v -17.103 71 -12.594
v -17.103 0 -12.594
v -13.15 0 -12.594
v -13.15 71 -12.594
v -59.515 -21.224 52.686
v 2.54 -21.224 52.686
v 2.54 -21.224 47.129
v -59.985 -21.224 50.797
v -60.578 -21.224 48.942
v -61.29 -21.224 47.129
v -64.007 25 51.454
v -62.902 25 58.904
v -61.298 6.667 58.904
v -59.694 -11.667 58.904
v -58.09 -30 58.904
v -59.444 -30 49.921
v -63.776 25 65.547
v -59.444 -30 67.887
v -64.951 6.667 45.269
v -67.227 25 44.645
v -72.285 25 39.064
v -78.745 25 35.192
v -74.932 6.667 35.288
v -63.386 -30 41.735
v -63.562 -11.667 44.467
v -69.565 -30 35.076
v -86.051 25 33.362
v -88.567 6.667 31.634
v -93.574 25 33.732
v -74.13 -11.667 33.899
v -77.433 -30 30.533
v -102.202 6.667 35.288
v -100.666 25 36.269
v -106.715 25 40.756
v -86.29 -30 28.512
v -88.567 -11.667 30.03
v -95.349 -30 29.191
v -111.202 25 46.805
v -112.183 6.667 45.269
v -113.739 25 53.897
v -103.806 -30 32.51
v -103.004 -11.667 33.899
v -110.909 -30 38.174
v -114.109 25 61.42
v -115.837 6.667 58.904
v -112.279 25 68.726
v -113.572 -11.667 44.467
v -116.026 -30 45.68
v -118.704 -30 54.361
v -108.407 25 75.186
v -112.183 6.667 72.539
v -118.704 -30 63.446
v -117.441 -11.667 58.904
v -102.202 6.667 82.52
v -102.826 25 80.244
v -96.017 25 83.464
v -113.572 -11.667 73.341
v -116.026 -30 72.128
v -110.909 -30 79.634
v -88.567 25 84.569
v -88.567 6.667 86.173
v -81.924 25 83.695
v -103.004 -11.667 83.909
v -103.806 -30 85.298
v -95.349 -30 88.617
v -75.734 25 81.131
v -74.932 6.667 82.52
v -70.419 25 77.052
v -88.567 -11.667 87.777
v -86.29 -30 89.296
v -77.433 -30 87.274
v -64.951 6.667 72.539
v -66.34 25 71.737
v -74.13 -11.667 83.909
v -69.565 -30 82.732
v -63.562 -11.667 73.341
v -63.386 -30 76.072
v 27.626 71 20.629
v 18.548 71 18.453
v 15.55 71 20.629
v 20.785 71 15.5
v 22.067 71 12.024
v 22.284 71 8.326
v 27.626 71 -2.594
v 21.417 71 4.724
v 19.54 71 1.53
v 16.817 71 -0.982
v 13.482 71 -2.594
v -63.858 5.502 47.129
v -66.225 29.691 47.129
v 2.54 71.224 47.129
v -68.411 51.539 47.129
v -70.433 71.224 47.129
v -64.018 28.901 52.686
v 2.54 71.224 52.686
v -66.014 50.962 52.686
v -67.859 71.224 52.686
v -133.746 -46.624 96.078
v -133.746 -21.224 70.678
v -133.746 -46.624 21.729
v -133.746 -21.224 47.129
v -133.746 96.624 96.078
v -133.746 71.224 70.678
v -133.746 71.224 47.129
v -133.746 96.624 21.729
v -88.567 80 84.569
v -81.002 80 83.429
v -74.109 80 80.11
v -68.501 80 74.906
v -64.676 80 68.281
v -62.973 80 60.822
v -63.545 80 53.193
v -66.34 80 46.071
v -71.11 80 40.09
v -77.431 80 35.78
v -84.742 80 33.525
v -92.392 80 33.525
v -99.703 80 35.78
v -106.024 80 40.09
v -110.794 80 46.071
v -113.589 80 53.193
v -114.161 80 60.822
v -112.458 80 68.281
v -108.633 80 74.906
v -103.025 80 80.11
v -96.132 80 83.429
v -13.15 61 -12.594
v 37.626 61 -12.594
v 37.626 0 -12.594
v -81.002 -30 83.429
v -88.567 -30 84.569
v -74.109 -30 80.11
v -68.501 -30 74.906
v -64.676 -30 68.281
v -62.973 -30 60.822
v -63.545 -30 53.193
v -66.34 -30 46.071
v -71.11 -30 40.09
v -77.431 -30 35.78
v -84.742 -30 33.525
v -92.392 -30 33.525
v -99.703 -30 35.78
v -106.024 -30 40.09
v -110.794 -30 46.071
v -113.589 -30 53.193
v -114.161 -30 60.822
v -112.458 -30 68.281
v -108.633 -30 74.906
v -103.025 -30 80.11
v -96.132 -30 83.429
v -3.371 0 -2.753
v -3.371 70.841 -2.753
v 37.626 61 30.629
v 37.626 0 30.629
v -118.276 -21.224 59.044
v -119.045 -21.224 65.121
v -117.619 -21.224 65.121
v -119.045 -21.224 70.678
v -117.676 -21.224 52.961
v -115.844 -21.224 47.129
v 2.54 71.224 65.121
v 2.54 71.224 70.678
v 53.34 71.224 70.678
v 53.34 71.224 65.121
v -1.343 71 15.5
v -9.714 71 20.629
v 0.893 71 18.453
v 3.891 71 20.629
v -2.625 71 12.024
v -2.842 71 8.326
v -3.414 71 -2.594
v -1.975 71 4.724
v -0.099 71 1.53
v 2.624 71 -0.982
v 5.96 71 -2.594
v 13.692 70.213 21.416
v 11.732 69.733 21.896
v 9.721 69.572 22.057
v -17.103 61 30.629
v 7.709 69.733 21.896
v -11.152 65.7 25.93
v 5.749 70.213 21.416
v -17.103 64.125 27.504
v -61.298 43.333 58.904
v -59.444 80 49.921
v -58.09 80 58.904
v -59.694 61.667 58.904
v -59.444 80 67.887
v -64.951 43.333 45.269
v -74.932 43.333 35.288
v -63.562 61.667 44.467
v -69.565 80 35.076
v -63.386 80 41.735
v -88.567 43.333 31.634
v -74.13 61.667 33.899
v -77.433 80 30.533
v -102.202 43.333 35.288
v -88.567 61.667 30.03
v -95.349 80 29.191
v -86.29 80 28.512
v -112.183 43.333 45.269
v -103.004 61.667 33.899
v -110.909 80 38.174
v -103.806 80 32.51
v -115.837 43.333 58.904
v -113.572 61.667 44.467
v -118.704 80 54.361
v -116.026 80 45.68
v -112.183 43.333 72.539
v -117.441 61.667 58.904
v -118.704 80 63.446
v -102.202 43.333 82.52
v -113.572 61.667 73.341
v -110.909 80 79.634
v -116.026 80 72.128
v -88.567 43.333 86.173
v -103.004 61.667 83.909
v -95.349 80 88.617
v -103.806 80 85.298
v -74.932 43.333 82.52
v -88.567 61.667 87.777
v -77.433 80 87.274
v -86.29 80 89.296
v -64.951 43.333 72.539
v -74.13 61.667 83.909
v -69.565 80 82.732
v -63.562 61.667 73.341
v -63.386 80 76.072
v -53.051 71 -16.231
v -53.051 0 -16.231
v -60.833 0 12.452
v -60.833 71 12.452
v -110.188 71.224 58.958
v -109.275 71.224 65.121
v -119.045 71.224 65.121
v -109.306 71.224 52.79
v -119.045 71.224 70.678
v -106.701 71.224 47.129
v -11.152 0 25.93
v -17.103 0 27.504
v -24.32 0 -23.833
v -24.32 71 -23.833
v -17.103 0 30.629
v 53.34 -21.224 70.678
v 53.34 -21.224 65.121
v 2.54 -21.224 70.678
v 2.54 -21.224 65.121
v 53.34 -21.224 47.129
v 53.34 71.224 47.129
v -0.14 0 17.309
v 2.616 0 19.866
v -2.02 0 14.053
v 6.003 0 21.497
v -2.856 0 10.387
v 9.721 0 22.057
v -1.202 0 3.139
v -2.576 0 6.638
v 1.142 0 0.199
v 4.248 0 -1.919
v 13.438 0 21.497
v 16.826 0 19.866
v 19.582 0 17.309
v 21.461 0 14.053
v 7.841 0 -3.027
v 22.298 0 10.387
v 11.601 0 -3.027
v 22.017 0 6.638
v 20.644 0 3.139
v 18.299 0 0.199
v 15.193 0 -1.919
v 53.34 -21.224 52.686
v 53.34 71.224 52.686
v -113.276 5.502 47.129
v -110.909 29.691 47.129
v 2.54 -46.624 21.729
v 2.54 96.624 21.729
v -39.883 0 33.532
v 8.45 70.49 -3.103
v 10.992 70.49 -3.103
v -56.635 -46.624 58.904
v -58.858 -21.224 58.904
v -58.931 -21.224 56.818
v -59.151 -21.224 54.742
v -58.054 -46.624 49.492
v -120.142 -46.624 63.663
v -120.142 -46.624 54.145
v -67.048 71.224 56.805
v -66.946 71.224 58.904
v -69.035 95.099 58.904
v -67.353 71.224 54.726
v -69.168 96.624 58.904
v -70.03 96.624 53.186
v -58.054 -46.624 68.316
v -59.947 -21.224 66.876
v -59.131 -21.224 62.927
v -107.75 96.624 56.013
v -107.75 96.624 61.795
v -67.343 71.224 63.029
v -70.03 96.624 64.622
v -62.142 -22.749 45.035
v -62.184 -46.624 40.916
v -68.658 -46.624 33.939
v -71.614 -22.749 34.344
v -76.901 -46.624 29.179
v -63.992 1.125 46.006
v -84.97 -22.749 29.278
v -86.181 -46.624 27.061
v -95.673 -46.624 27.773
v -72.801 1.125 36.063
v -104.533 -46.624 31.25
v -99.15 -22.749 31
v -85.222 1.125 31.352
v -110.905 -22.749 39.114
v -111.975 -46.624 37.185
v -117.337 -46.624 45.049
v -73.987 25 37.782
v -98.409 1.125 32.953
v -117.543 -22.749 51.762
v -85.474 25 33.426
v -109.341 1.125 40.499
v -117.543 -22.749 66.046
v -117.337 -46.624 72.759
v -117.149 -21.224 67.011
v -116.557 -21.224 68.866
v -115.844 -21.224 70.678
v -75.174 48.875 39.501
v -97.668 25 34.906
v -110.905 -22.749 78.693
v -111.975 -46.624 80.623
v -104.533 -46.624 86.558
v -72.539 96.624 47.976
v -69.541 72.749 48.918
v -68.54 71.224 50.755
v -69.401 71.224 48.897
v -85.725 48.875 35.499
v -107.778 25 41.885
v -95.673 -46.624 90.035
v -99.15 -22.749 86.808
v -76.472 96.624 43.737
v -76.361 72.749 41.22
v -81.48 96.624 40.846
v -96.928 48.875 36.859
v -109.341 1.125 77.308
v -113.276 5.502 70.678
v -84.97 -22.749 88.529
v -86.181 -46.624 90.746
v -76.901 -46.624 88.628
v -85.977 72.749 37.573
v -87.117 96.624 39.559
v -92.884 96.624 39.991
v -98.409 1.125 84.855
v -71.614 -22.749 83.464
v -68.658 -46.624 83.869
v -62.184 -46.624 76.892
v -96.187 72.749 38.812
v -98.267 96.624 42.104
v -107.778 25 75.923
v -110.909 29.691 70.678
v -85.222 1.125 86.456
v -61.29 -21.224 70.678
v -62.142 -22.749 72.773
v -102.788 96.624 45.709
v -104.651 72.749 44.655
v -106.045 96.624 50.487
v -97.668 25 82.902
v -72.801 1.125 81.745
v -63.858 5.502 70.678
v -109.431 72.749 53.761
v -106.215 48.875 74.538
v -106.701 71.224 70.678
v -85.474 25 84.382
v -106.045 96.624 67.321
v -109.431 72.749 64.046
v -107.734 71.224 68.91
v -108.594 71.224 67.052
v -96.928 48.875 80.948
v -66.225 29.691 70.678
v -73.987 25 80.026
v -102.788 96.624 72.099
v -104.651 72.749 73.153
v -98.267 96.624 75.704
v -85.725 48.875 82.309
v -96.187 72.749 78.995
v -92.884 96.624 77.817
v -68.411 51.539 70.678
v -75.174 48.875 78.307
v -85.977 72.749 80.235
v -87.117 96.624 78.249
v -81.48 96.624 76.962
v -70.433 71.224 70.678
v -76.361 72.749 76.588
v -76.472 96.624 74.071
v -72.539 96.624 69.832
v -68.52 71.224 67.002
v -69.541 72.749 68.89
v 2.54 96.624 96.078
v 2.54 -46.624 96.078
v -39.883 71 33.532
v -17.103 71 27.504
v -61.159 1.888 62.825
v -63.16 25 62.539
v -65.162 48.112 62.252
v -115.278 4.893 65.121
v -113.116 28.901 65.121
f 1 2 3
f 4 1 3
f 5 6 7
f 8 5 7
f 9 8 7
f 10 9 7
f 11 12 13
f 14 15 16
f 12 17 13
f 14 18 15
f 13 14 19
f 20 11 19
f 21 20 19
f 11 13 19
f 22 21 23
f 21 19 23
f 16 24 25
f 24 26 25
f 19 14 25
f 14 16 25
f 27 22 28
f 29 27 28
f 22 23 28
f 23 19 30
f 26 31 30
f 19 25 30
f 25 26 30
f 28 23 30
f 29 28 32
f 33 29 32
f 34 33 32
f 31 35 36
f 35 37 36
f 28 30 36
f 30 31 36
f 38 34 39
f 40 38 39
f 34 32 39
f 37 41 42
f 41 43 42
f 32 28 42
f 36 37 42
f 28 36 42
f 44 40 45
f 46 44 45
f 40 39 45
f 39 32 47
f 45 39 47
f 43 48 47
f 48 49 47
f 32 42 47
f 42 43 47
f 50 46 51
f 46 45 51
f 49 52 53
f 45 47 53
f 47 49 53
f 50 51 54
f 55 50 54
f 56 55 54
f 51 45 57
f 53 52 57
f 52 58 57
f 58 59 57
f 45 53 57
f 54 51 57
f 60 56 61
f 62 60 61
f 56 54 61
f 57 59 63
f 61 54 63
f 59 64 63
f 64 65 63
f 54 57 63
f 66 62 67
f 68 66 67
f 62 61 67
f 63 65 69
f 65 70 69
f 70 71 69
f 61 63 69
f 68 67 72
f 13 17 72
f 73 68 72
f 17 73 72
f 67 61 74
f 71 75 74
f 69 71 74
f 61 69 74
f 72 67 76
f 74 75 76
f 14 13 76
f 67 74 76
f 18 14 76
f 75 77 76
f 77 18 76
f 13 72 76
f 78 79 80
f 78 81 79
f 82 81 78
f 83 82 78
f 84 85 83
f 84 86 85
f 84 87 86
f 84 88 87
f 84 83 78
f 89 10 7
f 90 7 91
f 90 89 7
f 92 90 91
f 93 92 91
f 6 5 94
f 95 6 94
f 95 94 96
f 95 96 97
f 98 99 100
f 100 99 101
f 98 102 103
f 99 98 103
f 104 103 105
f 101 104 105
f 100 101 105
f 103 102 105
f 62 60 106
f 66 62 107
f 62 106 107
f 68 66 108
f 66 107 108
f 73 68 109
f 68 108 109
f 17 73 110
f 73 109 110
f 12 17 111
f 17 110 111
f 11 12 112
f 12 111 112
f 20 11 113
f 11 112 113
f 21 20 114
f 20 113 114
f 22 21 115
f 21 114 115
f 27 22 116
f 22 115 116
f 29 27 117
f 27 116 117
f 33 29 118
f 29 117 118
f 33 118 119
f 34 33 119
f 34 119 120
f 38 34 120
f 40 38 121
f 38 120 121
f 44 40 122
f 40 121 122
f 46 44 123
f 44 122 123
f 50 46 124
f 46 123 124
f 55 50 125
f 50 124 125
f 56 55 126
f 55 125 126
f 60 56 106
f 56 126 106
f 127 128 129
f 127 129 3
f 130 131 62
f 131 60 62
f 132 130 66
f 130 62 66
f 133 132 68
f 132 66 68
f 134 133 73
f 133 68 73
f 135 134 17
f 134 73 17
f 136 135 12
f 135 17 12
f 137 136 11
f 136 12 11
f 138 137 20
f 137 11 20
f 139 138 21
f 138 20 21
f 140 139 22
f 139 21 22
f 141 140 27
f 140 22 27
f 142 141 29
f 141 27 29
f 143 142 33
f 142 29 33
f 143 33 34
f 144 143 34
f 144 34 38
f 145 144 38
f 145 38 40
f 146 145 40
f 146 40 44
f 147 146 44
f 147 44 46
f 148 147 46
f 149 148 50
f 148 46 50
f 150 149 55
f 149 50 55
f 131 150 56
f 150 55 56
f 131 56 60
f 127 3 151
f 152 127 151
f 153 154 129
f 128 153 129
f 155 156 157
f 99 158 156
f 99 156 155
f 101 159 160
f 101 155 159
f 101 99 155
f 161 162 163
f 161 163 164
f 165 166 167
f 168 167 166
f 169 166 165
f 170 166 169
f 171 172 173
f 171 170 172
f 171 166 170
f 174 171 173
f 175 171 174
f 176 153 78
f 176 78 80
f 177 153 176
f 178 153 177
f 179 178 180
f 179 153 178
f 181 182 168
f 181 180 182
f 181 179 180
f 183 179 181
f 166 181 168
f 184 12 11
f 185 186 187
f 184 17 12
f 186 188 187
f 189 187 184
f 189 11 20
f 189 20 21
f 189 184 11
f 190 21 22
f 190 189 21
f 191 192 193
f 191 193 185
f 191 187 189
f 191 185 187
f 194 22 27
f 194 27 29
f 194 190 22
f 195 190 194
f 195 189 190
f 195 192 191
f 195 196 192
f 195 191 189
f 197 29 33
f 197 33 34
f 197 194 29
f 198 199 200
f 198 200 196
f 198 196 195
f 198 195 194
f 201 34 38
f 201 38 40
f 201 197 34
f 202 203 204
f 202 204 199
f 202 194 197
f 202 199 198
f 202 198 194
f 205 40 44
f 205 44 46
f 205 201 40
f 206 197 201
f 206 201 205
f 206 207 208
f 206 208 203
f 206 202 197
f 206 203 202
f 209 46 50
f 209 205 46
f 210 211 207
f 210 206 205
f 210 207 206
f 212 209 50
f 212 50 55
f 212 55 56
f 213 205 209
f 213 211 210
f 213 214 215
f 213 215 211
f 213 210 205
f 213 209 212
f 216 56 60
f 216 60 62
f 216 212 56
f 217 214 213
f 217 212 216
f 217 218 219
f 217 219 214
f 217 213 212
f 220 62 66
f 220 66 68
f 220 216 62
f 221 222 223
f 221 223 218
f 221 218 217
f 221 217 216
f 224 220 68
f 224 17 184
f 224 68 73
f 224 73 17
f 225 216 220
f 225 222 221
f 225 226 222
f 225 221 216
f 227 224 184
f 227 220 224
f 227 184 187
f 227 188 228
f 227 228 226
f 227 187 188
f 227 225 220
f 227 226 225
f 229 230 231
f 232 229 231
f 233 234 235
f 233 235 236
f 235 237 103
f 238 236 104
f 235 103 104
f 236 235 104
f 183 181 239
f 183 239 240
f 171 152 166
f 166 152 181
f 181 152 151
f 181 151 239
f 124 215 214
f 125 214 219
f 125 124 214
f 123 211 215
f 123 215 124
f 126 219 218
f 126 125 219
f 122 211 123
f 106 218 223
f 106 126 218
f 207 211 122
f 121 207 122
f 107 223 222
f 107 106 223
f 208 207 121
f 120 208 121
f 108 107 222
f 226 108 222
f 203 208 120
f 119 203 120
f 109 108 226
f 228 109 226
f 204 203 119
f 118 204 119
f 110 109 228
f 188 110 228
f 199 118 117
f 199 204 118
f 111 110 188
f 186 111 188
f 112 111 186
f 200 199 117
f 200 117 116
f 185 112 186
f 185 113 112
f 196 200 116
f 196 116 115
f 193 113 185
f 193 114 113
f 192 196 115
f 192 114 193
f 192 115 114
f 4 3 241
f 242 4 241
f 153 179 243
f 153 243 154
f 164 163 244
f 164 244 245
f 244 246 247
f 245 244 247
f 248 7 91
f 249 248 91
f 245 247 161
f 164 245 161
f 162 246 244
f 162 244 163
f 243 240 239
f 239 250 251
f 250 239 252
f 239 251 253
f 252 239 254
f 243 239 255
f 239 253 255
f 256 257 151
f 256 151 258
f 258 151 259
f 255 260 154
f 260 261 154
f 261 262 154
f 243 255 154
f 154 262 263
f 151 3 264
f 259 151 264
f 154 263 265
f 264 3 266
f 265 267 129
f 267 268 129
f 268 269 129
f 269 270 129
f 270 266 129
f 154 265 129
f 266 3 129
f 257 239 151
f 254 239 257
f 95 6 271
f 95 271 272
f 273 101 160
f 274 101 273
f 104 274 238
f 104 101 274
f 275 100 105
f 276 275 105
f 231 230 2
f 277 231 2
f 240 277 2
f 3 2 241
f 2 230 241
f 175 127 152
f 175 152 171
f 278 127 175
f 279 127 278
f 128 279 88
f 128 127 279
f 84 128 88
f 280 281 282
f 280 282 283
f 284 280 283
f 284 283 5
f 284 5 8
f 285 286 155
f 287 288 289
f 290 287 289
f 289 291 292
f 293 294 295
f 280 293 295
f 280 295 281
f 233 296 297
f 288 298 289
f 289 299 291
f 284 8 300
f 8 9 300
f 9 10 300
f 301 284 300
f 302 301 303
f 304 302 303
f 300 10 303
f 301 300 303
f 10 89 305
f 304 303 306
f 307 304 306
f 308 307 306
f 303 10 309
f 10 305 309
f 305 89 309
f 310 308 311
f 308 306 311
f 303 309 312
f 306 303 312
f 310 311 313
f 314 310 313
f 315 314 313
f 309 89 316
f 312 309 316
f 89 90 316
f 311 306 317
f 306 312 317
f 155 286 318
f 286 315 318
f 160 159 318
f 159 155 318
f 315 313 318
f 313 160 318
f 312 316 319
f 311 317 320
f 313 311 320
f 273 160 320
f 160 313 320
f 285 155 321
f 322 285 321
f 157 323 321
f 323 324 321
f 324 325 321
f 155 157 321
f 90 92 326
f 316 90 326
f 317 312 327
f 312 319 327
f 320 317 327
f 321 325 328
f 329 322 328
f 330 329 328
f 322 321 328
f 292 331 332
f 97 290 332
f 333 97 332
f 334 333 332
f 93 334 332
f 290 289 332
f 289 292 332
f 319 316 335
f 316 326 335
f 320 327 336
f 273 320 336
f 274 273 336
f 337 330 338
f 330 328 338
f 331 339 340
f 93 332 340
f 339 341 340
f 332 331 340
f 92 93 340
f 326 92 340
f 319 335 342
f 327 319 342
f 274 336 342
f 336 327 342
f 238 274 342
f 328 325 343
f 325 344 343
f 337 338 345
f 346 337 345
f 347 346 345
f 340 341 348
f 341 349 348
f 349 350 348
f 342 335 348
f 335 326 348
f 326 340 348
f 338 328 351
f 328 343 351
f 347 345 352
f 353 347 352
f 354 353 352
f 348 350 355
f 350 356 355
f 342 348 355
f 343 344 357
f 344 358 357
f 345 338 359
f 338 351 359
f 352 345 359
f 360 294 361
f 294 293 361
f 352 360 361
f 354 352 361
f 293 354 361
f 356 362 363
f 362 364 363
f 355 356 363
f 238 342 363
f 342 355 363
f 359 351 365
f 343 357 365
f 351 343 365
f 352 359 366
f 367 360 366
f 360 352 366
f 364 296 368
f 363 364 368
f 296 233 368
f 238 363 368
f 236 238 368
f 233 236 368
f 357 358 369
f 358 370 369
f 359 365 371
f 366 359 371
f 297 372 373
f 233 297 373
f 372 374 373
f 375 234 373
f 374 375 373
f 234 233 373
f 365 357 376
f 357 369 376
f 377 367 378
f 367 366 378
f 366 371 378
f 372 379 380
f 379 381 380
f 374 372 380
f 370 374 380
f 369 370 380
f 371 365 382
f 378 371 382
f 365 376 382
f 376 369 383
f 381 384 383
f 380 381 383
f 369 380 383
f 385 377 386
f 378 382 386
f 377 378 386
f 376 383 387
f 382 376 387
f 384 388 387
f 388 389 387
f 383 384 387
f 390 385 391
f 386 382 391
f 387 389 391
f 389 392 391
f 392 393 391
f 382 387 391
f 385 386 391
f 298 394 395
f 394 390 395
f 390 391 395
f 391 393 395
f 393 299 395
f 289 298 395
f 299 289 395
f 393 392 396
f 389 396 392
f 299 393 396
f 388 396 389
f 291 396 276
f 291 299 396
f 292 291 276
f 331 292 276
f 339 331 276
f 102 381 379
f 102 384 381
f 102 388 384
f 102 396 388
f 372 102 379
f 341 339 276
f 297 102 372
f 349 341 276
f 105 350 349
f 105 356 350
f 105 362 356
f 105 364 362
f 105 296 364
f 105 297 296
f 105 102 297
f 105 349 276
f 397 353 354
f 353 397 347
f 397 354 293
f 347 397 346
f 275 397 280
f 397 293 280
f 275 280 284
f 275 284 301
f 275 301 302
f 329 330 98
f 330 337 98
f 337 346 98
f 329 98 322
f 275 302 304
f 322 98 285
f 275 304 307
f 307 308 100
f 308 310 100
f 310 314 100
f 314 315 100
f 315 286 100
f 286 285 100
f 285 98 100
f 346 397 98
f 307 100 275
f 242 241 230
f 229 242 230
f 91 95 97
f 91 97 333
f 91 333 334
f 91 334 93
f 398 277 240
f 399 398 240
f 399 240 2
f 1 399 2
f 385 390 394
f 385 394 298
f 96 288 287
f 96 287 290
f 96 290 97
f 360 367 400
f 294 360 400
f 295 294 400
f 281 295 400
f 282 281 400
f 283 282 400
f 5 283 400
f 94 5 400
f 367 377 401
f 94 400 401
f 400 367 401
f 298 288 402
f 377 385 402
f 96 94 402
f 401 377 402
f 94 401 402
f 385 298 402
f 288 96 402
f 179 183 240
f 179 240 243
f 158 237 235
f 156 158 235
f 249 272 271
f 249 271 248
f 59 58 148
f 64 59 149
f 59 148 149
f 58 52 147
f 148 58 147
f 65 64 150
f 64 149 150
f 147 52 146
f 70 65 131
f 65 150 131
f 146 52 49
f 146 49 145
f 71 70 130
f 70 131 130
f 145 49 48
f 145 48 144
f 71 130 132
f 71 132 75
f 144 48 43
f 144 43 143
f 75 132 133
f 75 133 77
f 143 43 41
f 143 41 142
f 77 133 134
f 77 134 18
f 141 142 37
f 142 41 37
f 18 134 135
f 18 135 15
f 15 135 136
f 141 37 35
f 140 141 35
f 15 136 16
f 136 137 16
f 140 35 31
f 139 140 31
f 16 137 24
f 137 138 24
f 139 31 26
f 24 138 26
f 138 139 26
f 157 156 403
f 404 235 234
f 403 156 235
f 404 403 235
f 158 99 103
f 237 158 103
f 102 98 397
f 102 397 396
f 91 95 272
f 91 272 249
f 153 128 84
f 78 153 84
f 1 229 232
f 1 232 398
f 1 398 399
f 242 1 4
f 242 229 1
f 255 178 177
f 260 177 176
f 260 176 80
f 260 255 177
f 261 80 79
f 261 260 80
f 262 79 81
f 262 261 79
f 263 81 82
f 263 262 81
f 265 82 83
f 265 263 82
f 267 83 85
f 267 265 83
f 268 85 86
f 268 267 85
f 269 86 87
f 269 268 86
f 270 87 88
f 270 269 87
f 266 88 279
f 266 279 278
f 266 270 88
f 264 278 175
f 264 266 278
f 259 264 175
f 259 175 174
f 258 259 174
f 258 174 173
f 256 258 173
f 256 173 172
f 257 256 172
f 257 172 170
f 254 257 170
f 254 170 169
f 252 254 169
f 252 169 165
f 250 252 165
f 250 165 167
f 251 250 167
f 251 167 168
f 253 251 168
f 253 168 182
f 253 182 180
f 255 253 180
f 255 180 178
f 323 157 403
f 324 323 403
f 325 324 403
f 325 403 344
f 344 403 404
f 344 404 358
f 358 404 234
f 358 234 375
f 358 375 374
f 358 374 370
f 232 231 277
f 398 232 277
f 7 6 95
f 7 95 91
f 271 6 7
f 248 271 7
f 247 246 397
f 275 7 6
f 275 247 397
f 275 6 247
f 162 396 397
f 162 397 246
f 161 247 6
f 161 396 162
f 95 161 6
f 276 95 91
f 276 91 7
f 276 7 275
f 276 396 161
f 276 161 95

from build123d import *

# Parameters (mm, degrees)
BOSS_EXTRUDE1_DEPTH           = 71
SKETCH1_R                     = 12.612546325
BOSS_EXTRUDE1_2_DEPTH         = 71
CHAMFER1_SIZE                 = 10
BOSS_EXTRUDE2_START           = 25
SKETCH2_R                     = 25.665481482
BOSS_EXTRUDE2_DEPTH           = 55
BOSS_EXTRUDE2_TAPER           = -5
BOSS_EXTRUDE2_OTHER_WAY_DEPTH = 55
BOSS_EXTRUDE2_OTHER_WAY_TAPER = -5
SKETCH2_3_R                   = 25.665481482
CUT_EXTRUDE1_DEPTH            = 127
EXTRUDE_THIN4_START           = -136.285637615
EXTRUDE_THIN4_OUTLINE_W       = 74.349241095
EXTRUDE_THIN4_OUTLINE_H       = 143.248499752
EXTRUDE_THIN4_OUTLINE_W_2     = 23.549241095
EXTRUDE_THIN4_OUTLINE_H_2     = 92.448499752
EXTRUDE_THIN4_DEPTH           = 136.285637615
EXTRUDE_THIN4_START_2         = -81.131505871
EXTRUDE_THIN4_3_OUTLINE_W     = 25.4
EXTRUDE_THIN4_3_OUTLINE_H     = 92.448499752
EXTRUDE_THIN4_3_DEPTH         = 81.131505871
EXTRUDE_THIN4_START_3         = -62.055403382
EXTRUDE_THIN4_5_OUTLINE_W     = 25.4
EXTRUDE_THIN4_5_OUTLINE_H     = 92.448499752
EXTRUDE_THIN4_5_DEPTH         = 62.055403382
EXTRUDE_THIN4_START_4         = -121.585490263
EXTRUDE_THIN4_6_OUTLINE_W     = 25.4
EXTRUDE_THIN4_6_OUTLINE_H     = 92.448499752
EXTRUDE_THIN4_6_DEPTH         = 1.426630024
EXTRUDE_THIN4_START_5         = 65.121304361
EXTRUDE_THIN4_7_OUTLINE_W     = 58.103456857
EXTRUDE_THIN4_7_OUTLINE_H     = 92.448499752
EXTRUDE_THIN4_7_DEPTH         = 25.4
SKETCH3_2_W                   = 5.557193525
SKETCH3_2_H                   = 92.448499752
SKETCH3_2_W_2                 = 5.557193524
BOSS_EXTRUDE3_DEPTH           = 50.8


with BuildPart() as part:
    # Sketch1 → Boss-Extrude1 (new body)
    with BuildSketch(Plane(origin=(0, 0, 0), x_dir=(1, 0, 0), z_dir=(0, 1, 0))):
        Polygon((-17.102724768, -27.50448581), (-17.102724768, 12.593824602), (-13.150491386, 12.593824602), (-24.320277596, 23.833435941), (-53.051166582, 16.230886979), (-60.83261054, -12.452067238), (-39.883165511, -33.532472492), align=None)
    extrude(amount=BOSS_EXTRUDE1_DEPTH)


with BuildPart() as body_2:
    # Sketch1 → Boss-Extrude1 2 (new body)
    with BuildSketch(Plane(origin=(0, 0, 0), x_dir=(1, 0, 0), z_dir=(0, 1, 0))):
        Polygon((37.625994489, 12.593824602), (-13.150491386, 12.593824602), (-3.370832568, 2.753030688), (-11.152276525, -25.929923529), (-17.102724768, -27.50448581), (-17.102724768, -30.629425265), (37.625994489, -30.629425265), align=None)
        with Locations(Location((9.720782427, -9.444950833, 0), (0, 0, 270))):
            Circle(SKETCH1_R, mode=Mode.SUBTRACT)
    extrude(amount=BOSS_EXTRUDE1_2_DEPTH)

    # Chamfer1
    # the kernel refuses this chamfer: 10 mm, written as the material it takes off along each edge
    with BuildSketch(Plane(origin=(63.342824368, 71, -12.593824602), x_dir=(0, -1, 0), z_dir=(-1, 0, 0))) as chamfer1_piece_1:
        Polygon((CHAMFER1_SIZE, 0), (0, CHAMFER1_SIZE), (0, 0), align=None)
    extrude(amount=102.210145634, mode=Mode.SUBTRACT)
    with BuildSketch(Plane(origin=(37.625994489, 71, 56.346255145), x_dir=(0, -1, 0), z_dir=(0, 0, -1))) as chamfer1_piece_2:
        Polygon((CHAMFER1_SIZE, 0), (0, CHAMFER1_SIZE), (0, 0), align=None)
    extrude(amount=94.656909626, mode=Mode.SUBTRACT)
    with BuildSketch(Plane(origin=(-42.819554647, 71, 30.629425265), x_dir=(0, -1, 0), z_dir=(1, 0, 0))) as chamfer1_piece_3:
        Polygon((CHAMFER1_SIZE, 0), (0, CHAMFER1_SIZE), (0, 0), align=None)
    extrude(amount=106.162379015, mode=Mode.SUBTRACT)


with BuildPart() as body_3:
    # Sketch2 → Boss-Extrude2 (new body)
    with BuildSketch(Plane(origin=(0, 0, 0), x_dir=(1, 0, 0), z_dir=(0, 1, 0)).offset(BOSS_EXTRUDE2_START)):
        with Locations((-88.567132287, -58.903877338)):
            Circle(SKETCH2_R)
    extrude(amount=BOSS_EXTRUDE2_DEPTH, taper=BOSS_EXTRUDE2_TAPER)

    # Sketch2 → Boss-Extrude2 other way (add)
    with BuildSketch(Plane(origin=(0, 0, 0), x_dir=(1, 0, 0), z_dir=(0, 1, 0)).offset(BOSS_EXTRUDE2_START)):
        with Locations((-88.567132287, -58.903877338)):
            Circle(SKETCH2_R)
    extrude(amount=-BOSS_EXTRUDE2_OTHER_WAY_DEPTH, taper=BOSS_EXTRUDE2_OTHER_WAY_TAPER)

    # Sketch2<3> → Cut-Extrude1 (cut, symmetric)
    with BuildSketch(Plane(origin=(0, 0, 0), x_dir=(1, 0, 0), z_dir=(0, 1, 0))):
        with Locations(Location((-88.567132287, -58.903877338, 0), (0, 0, 270))):
            Circle(SKETCH2_3_R)
    extrude(amount=CUT_EXTRUDE1_DEPTH, both=True, mode=Mode.SUBTRACT)


with BuildPart() as cut_extrude1_piece_1:
    # of the separate pieces the step leaves, piece 1, a body of its own (cut_extrude1_pieces)
    add(body_3.part.solids().sort_by_distance((-58.089774312, 80, 58.903877338))[0])


with BuildPart() as cut_extrude1_piece_2:
    # of the separate pieces the step leaves, piece 2, a body of its own (cut_extrude1_pieces)
    add(body_3.part.solids().sort_by_distance((-58.089774312, -30, 58.903877338))[0])


with BuildPart() as body_5:
    # Extrude-Thin4: read off the stored shape, not the designer's step
    # Extrude-Thin4 outline → Extrude-Thin4 (new body)
    with BuildSketch(Plane(origin=(2.54, 0, 0), x_dir=(0, 0, -1), z_dir=(1, 0, 0)).offset(EXTRUDE_THIN4_START)):
        with Locations((-58.903877339, 25)):
            Rectangle(EXTRUDE_THIN4_OUTLINE_W, EXTRUDE_THIN4_OUTLINE_H)
        with Locations((-58.903877339, 25)):
            Rectangle(EXTRUDE_THIN4_OUTLINE_W_2, EXTRUDE_THIN4_OUTLINE_H_2, mode=Mode.SUBTRACT)
    extrude(amount=EXTRUDE_THIN4_DEPTH)

    # Extrude-Thin4 2 outline → Extrude-Thin4 2 (revolve, cut)
    with BuildSketch(Plane(origin=(-88.567132287, 0, 58.903877338), x_dir=(1, 0, 0), z_dir=(0, 0, 1))):
        Polygon((0, -46.624249876), (31.931791379, -46.624249876), (19.399171584, 96.624249876), (0, 96.624249876), align=None)
    revolve(axis=Axis((-88.567132287, 0, 58.903877338), (0, 1, 0)), mode=Mode.SUBTRACT)



with BuildPart() as body_6:
    # Extrude-Thin4 3 outline → Extrude-Thin4 3 (new body)
    with BuildSketch(Plane(origin=(2.54, 0, 0), x_dir=(0, 0, -1), z_dir=(1, 0, 0)).offset(EXTRUDE_THIN4_START_2)):
        with Locations((-65.386450315, 25)):
            Rectangle(EXTRUDE_THIN4_3_OUTLINE_W, EXTRUDE_THIN4_3_OUTLINE_H)
    extrude(amount=EXTRUDE_THIN4_3_DEPTH)

    # Extrude-Thin4 4 outline → Extrude-Thin4 4 (revolve, cut)
    with BuildSketch(Plane(origin=(-88.567132287, 0, 58.903877338), x_dir=(1, 0, 0), z_dir=(0, 0, 1))):
        Polygon((0, -21.224249876), (29.709579326, -21.224249876), (21.621383594, 71.224250375), (0, 71.224250375), align=None)
    revolve(axis=Axis((-88.567132287, 0, 58.903877338), (0, 1, 0)), mode=Mode.SUBTRACT)


with BuildPart() as body_7:
    # Extrude-Thin4 5 outline → Extrude-Thin4 5 (new body)
    with BuildSketch(Plane(origin=(2.54, 0, 0), x_dir=(0, 0, -1), z_dir=(1, 0, 0)).offset(EXTRUDE_THIN4_START_3)):
        with Locations((-77.821304361, 25)):
            Rectangle(EXTRUDE_THIN4_5_OUTLINE_W, EXTRUDE_THIN4_5_OUTLINE_H)
    extrude(amount=EXTRUDE_THIN4_5_DEPTH)

    # Extrude-Thin4 6 outline → Extrude-Thin4 6 (add)
    with BuildSketch(Plane(origin=(2.54, 0, 0), x_dir=(0, 0, -1), z_dir=(1, 0, 0)).offset(EXTRUDE_THIN4_START_4)):
        with Locations((-77.821304361, 25)):
            Rectangle(EXTRUDE_THIN4_6_OUTLINE_W, EXTRUDE_THIN4_6_OUTLINE_H)
    extrude(amount=EXTRUDE_THIN4_6_DEPTH)

    # Extrude-Thin4 7 outline → Extrude-Thin4 7 (add)
    with BuildSketch(Plane.XY.offset(EXTRUDE_THIN4_START_5)):
        with Locations((-88.567131811, 25)):
            Rectangle(EXTRUDE_THIN4_7_OUTLINE_W, EXTRUDE_THIN4_7_OUTLINE_H)
    extrude(amount=EXTRUDE_THIN4_7_DEPTH)

    # Extrude-Thin4 8 outline → Extrude-Thin4 8 (revolve, cut)
    with BuildSketch(Plane(origin=(-88.567132287, 0, 58.903877338), x_dir=(1, 0, 0), z_dir=(0, 0, 1))):
        Polygon((0, -21.224249876), (29.709579326, -21.224249876), (21.621383635, 71.224249899), (0, 71.224249899), align=None)
    revolve(axis=Axis((-88.567132287, 0, 58.903877338), (0, 1, 0)), mode=Mode.SUBTRACT)


with BuildPart() as body_5_1:
    add(body_5.part)

    add(body_6.part)  # Boss-Extrude3 merges body 6

    add(body_7.part)  # Boss-Extrude3 merges body 7
    # Sketch3<2> → Boss-Extrude3 (add)
    with BuildSketch(Plane(origin=(2.54, 0, 0), x_dir=(0, 0, -1), z_dir=(1, 0, 0))):
        with Locations((-67.899901124, 25)):
            Rectangle(SKETCH3_2_W, SKETCH3_2_H)
        with Locations((-49.907853553, 25)):
            Rectangle(SKETCH3_2_W_2, SKETCH3_2_H)
    extrude(amount=BOSS_EXTRUDE3_DEPTH)


solid = Compound([part.part, body_2.part, cut_extrude1_piece_1.part, cut_extrude1_piece_2.part, body_5_1.part])
